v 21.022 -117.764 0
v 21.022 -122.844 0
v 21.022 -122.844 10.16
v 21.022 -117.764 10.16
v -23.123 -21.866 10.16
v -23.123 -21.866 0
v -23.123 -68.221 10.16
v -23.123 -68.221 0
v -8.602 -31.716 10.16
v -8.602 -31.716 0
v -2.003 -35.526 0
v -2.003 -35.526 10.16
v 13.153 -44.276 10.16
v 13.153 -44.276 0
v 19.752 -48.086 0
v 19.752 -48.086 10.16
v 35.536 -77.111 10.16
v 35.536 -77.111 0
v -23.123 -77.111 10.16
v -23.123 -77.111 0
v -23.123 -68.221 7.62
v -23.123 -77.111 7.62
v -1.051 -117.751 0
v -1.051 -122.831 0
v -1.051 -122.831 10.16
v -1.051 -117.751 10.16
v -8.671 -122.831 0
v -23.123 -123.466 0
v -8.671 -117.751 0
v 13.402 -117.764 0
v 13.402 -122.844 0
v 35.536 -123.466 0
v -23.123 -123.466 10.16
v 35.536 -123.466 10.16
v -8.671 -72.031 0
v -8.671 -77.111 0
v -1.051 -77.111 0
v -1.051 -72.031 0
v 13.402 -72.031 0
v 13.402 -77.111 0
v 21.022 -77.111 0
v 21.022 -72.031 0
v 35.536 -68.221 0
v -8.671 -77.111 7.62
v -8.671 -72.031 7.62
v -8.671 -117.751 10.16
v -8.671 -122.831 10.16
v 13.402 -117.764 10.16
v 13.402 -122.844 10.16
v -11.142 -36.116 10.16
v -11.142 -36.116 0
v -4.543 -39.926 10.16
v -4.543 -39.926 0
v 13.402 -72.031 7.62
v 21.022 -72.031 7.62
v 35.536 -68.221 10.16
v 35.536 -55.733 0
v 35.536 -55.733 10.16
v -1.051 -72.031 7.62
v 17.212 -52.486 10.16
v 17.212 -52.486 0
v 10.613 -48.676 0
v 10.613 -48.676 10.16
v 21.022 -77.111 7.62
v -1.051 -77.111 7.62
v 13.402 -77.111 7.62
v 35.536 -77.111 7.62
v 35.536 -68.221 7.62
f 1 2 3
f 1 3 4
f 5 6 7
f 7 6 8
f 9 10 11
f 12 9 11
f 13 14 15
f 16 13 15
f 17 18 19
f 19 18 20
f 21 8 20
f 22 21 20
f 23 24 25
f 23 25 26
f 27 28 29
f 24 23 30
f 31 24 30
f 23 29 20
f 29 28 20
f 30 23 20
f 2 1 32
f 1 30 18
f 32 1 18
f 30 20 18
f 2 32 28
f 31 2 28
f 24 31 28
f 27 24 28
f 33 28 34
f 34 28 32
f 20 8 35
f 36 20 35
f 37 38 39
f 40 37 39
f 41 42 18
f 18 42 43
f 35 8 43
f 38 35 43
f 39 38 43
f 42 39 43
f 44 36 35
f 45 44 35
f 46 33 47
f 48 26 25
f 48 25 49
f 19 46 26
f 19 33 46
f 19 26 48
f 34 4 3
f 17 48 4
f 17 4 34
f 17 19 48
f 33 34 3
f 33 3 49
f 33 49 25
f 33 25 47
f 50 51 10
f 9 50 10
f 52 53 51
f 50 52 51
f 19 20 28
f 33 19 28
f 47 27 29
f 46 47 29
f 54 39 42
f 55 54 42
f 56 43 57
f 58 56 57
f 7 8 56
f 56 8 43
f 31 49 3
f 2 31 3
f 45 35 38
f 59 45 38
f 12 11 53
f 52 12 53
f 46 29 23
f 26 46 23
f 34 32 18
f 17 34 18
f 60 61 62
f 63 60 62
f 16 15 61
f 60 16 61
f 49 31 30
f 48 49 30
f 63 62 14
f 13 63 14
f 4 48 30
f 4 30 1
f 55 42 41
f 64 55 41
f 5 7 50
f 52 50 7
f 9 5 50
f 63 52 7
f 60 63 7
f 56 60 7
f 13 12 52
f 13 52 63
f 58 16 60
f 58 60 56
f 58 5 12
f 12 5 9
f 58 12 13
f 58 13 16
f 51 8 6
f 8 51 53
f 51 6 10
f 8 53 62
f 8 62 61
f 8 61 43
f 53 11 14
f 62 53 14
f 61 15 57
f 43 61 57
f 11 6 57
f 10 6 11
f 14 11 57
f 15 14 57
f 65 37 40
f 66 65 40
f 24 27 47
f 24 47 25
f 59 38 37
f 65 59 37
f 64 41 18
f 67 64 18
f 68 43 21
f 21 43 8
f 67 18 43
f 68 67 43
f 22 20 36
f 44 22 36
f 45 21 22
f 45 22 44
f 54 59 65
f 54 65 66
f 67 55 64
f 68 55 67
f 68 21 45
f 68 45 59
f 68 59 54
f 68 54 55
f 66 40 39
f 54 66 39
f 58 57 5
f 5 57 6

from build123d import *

# Parameters (mm, degrees)
F0_W     = 7.62
F0_H     = 5.08
F1_DEPTH = 10.16
F2_DEPTH = 7.62


with BuildPart() as f1:
    # F0 (on Top) → F1 (new body)
    with BuildSketch(Plane.XY):
        Polygon((35.535632, -55.732704), (-23.123154, -21.866039), (-23.123154, -68.221039), (35.535632, -68.221039), align=None)
        Polygon((-11.14219, -36.1156), (-8.60219, -31.716191), (-2.003076, -35.526191), (-4.543076, -39.9256), align=None, mode=Mode.SUBTRACT)
        Polygon((17.212002, -52.4859), (10.612888, -48.6759), (13.152888, -44.276491), (19.752002, -48.086491), align=None, mode=Mode.SUBTRACT)
        Polygon((-8.670554, -77.111039), (-23.123154, -77.111039), (-23.123154, -123.466039), (8.804092, -123.466039), (25.314092, -123.466039), (35.535632, -123.466039), (35.535632, -77.111039), (21.022046, -77.111039), (13.402046, -77.111039), (-1.050554, -77.111039), align=None)
        with Locations((-4.860554, -120.291039)):
            Rectangle(F0_W, F0_H, mode=Mode.SUBTRACT)
        with Locations((17.212046, -120.304264)):
            Rectangle(F0_W, F0_H, mode=Mode.SUBTRACT)
    extrude(amount=F1_DEPTH)


with BuildPart() as f2:
    # F0 (on Top) → F2 (new body)
    with BuildSketch(Plane.XY):
        Polygon((35.535632, -68.221039), (-23.123154, -68.221039), (-23.123154, -77.111039), (-8.670554, -77.111039), (-8.670554, -72.031039), (-1.050554, -72.031039), (-1.050554, -77.111039), (13.402046, -77.111039), (13.402046, -72.031039), (21.022046, -72.031039), (21.022046, -77.111039), (35.535632, -77.111039), align=None)
    extrude(amount=F2_DEPTH)


solid = Compound([f1.part, f2.part])
